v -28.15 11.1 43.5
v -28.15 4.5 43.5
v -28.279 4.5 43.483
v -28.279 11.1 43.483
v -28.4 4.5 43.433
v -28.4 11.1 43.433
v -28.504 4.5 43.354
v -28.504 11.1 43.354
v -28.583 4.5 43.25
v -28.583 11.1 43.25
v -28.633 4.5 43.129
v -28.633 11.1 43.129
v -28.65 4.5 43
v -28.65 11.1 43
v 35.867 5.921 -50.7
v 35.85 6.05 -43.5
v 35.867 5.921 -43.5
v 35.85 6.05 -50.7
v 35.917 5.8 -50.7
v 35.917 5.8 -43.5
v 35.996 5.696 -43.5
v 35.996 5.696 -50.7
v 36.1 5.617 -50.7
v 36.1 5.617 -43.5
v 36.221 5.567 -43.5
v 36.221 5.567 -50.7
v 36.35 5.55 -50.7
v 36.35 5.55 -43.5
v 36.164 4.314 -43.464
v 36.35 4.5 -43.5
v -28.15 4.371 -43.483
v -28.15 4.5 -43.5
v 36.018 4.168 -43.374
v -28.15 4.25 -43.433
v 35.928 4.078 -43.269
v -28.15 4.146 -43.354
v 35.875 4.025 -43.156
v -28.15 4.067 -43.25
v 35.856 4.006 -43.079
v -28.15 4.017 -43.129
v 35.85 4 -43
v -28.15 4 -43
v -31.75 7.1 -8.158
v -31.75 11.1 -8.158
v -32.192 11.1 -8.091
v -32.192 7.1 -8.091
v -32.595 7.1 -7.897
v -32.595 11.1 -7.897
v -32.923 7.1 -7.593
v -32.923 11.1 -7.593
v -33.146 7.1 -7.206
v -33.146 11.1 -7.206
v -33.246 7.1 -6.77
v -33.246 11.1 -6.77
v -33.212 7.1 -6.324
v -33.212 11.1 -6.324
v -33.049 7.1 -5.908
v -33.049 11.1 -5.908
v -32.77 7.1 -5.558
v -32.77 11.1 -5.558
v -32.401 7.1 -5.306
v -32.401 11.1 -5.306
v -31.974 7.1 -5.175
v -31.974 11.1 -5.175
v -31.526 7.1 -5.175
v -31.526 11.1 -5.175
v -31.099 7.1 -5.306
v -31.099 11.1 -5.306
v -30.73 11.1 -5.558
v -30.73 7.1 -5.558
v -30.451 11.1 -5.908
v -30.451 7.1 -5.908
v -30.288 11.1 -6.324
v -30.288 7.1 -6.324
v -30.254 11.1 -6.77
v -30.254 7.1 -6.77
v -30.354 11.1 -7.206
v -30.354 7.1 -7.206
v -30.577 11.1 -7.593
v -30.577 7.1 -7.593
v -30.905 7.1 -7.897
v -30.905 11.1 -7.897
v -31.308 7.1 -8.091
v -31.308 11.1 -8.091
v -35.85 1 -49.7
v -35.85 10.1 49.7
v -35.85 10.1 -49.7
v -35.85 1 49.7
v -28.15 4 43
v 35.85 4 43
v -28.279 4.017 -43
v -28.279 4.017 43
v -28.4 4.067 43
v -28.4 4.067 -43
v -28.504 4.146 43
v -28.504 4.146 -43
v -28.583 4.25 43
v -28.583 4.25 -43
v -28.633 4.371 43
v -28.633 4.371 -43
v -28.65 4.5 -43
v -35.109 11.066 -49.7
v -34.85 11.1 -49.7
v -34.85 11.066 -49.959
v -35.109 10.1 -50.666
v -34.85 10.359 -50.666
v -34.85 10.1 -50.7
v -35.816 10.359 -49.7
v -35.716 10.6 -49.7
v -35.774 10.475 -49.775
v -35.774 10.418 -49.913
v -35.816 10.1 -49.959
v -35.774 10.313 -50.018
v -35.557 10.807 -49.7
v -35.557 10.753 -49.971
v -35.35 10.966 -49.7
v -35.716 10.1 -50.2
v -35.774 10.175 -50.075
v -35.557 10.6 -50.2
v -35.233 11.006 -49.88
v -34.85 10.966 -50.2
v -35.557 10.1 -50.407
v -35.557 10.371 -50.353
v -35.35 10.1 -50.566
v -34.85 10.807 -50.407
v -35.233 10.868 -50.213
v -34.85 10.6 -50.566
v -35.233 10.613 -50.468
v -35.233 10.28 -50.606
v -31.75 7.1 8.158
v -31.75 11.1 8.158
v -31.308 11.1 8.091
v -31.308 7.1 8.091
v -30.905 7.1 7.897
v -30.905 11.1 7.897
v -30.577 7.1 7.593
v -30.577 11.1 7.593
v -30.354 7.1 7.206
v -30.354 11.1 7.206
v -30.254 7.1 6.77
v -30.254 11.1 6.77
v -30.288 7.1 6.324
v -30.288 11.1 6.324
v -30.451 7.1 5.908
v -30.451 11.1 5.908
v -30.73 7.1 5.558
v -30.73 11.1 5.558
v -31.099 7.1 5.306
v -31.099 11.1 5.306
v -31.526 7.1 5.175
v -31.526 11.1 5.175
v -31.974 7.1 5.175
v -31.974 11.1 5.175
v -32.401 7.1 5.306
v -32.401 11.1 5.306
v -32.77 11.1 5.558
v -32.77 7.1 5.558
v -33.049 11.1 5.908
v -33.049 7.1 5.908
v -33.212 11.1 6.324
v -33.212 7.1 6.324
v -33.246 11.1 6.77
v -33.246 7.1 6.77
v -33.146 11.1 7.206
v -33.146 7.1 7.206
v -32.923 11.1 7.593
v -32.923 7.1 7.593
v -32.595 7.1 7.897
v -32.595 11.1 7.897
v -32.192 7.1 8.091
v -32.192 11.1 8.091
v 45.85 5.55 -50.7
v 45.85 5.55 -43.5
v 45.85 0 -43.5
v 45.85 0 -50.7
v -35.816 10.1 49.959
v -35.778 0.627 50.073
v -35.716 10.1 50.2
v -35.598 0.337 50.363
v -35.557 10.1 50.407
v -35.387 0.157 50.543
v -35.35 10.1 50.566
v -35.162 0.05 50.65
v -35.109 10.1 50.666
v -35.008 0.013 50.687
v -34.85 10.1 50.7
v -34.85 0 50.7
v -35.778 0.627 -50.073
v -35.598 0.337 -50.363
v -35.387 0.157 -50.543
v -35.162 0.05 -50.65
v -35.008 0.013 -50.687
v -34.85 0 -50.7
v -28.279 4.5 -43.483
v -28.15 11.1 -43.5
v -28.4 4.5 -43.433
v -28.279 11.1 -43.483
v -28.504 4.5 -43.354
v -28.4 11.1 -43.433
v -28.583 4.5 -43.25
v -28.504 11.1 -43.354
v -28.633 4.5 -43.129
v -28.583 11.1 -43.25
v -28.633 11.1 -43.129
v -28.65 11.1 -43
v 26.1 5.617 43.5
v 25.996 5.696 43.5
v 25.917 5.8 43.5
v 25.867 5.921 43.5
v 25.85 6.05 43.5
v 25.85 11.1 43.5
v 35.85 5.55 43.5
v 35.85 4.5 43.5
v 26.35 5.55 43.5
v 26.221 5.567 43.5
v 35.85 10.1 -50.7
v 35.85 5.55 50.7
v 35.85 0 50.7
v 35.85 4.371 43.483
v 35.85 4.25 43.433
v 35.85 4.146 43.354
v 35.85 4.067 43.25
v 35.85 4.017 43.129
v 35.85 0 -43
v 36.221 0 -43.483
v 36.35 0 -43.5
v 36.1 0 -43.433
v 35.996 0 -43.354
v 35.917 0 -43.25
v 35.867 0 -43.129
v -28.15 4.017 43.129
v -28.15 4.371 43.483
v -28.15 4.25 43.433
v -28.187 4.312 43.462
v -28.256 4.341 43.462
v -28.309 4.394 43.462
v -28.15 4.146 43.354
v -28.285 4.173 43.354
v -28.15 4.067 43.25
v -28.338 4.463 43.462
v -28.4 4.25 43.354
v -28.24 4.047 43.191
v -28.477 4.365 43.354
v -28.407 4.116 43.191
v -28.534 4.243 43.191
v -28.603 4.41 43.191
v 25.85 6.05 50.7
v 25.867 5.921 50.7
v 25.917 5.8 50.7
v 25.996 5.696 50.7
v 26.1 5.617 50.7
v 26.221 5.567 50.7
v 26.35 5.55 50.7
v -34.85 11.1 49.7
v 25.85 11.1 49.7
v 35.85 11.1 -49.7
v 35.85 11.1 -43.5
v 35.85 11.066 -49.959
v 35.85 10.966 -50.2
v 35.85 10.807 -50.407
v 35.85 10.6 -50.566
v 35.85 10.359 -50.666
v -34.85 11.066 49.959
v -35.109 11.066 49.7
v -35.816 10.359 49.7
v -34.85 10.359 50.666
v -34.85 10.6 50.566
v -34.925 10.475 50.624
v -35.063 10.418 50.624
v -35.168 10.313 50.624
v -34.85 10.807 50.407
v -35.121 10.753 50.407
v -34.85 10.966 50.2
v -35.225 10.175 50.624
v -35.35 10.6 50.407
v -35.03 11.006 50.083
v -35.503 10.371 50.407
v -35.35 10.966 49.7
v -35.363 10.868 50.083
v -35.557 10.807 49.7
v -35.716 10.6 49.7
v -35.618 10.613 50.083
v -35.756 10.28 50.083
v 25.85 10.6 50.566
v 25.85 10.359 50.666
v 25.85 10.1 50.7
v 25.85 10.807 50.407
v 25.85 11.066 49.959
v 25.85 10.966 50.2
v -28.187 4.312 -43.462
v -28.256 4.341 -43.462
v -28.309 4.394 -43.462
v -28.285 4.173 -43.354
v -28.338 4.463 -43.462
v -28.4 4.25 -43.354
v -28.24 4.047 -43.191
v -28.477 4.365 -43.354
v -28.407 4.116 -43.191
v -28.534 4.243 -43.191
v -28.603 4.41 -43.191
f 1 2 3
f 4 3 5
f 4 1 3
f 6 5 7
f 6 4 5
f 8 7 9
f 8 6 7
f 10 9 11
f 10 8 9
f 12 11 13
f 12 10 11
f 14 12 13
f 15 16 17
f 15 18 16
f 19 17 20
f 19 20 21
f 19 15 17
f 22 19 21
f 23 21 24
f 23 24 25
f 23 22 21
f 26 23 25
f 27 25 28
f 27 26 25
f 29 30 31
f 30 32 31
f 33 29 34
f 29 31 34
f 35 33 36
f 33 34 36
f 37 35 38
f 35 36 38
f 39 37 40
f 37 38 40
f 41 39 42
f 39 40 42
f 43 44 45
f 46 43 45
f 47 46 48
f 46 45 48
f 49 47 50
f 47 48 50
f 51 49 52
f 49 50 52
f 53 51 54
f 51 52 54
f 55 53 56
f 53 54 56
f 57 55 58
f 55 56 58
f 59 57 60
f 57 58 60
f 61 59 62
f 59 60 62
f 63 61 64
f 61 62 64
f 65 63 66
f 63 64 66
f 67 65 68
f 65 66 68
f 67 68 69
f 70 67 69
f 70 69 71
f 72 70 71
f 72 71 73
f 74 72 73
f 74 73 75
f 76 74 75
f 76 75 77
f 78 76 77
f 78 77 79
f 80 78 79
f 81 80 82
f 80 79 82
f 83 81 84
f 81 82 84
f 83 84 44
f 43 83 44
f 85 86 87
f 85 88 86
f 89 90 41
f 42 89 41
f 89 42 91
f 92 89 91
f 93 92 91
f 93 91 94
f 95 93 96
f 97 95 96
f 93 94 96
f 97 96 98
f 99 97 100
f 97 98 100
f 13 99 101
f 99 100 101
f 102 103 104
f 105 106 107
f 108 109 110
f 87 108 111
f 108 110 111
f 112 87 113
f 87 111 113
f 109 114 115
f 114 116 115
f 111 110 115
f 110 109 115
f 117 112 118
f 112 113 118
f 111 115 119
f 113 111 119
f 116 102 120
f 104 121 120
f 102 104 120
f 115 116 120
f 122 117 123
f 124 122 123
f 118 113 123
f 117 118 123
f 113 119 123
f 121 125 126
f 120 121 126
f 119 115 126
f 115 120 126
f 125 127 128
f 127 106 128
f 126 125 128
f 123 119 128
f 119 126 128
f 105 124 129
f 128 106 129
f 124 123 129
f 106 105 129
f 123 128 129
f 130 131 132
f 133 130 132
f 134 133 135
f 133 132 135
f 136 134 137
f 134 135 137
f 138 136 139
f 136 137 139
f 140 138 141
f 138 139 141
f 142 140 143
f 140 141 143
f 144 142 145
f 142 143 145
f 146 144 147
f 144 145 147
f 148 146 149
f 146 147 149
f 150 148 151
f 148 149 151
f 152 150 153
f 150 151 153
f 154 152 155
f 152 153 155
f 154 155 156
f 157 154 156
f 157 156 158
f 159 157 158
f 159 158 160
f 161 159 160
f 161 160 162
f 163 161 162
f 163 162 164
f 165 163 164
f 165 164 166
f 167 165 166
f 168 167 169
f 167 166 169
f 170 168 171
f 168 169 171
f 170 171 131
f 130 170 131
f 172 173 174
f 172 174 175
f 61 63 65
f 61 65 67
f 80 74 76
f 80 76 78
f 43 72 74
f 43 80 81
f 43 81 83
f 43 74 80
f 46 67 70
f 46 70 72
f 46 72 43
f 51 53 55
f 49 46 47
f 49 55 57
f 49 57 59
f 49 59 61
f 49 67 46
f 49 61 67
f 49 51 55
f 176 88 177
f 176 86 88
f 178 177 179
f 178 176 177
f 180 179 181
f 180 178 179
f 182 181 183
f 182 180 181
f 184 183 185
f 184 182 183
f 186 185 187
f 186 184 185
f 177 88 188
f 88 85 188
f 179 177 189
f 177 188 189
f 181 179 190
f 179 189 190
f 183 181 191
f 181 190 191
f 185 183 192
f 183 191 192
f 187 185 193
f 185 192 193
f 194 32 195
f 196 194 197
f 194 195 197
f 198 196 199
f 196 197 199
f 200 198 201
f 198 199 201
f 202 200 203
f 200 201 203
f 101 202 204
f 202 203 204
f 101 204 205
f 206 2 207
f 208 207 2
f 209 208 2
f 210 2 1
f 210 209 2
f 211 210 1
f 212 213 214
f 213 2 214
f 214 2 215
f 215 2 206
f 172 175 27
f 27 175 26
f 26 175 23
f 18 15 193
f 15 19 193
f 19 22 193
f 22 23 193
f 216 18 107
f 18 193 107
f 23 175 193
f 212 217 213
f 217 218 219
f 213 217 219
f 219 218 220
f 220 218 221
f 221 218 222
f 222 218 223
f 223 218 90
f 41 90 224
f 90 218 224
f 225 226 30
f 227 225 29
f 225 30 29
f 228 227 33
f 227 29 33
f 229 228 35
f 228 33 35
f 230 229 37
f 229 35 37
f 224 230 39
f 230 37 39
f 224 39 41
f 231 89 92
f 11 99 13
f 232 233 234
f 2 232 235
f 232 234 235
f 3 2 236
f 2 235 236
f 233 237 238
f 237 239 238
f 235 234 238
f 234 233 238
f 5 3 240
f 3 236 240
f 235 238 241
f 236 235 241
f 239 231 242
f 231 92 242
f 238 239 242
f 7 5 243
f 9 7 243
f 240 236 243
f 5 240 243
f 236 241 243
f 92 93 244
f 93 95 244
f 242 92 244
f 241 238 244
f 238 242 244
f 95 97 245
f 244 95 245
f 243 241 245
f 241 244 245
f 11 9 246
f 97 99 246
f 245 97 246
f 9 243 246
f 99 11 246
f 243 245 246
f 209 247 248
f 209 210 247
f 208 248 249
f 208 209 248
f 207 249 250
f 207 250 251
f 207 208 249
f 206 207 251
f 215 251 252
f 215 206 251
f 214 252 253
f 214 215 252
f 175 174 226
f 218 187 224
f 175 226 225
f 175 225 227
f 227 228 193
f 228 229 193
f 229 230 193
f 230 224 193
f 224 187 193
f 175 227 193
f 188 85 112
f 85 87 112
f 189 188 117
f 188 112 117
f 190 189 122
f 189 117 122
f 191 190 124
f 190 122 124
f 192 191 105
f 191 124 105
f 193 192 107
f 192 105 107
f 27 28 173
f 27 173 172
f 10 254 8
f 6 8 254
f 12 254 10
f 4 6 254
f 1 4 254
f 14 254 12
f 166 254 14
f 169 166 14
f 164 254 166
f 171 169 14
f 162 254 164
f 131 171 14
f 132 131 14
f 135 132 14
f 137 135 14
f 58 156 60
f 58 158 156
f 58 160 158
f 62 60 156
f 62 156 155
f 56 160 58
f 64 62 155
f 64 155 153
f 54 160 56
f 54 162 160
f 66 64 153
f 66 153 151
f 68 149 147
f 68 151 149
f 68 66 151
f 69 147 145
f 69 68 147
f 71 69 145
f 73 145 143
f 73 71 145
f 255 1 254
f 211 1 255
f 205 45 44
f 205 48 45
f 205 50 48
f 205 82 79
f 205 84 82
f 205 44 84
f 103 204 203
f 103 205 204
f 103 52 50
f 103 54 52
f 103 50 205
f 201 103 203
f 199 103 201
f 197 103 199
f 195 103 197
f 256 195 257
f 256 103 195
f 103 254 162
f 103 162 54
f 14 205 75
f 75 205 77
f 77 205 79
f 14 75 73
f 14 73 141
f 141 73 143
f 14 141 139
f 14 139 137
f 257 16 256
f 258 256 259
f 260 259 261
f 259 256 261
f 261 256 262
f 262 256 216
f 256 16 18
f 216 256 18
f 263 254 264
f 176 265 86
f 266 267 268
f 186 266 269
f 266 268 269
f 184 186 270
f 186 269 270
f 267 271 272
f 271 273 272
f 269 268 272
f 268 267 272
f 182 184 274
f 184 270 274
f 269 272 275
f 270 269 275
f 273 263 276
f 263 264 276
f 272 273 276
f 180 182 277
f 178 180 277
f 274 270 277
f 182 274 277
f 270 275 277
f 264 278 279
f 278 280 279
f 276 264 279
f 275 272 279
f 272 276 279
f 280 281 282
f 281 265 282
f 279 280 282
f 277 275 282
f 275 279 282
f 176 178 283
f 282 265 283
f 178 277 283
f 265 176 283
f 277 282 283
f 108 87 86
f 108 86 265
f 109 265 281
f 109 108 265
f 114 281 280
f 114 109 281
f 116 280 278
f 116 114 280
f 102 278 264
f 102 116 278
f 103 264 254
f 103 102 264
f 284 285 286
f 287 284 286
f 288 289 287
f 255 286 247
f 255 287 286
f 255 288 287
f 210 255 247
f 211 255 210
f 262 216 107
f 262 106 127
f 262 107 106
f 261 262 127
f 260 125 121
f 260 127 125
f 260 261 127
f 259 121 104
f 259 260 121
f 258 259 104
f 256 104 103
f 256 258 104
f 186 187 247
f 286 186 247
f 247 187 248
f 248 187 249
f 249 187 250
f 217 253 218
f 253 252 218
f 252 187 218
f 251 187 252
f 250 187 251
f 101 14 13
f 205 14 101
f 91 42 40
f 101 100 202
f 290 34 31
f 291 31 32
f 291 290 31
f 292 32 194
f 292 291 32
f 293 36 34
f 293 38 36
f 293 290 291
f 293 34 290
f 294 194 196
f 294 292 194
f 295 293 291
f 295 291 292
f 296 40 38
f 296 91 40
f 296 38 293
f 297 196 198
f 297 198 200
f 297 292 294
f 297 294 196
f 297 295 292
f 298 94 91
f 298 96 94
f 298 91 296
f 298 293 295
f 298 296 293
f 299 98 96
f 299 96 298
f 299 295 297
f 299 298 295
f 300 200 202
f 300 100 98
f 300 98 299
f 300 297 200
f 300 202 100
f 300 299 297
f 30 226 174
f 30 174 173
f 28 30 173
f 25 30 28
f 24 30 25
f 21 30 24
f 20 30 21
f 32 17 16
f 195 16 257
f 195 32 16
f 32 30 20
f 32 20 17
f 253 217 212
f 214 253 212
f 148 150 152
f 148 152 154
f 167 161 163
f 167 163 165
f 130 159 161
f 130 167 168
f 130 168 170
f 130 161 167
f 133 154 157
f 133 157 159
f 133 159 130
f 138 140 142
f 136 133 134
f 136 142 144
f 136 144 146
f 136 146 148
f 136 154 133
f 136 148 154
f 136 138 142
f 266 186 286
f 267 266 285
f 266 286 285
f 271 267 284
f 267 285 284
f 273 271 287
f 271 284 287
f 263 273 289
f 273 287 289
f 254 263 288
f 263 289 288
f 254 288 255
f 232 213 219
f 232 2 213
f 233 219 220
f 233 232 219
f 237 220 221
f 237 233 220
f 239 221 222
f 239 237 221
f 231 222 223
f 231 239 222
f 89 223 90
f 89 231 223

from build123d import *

# Parameters (mm, degrees)
SKETCH1_W           = 71.7
SKETCH1_H           = 101.4
BOSS_EXTRUDE1_DEPTH = 11.1
SKETCH5_W           = 87
SKETCH5_H           = 14.461590439
CUT_EXTRUDE1_DEPTH  = 64.5
FILLET2_R           = 1
SKETCH7_R           = 1.5
CUT_EXTRUDE3_DEPTH  = 4
SKETCH10_W          = 8.724930765
SKETCH10_H          = 5.55
CUT_EXTRUDE5_DEPTH  = 10
SKETCH11_W          = 7.2
SKETCH11_H          = 5.55
BOSS_EXTRUDE2_DEPTH = 10
FILLET3_R           = 0.5


with BuildPart() as part:
    # Sketch1 → Boss-Extrude1 (new body)
    with BuildSketch(Plane(origin=(0, 0, 0), x_dir=(1, 0, 0), z_dir=(0, 1, 0))):
        Rectangle(SKETCH1_W, SKETCH1_H)
    extrude(amount=BOSS_EXTRUDE1_DEPTH)

    # Sketch5 → Cut-Extrude1 (cut)
    with BuildSketch(Plane(origin=(35.85, 0, 0), x_dir=(0, 0, -1), z_dir=(1, 0, 0))):
        with Locations((0, 11.23079522)):
            Rectangle(SKETCH5_W, SKETCH5_H)
    extrude(amount=-CUT_EXTRUDE1_DEPTH, mode=Mode.SUBTRACT)

    # Fillet2
    fillet2_edges = [part.edges().sort_by_distance(p)[0] for p in [
        (0, 11.1, -50.7),
        (-35.85, 11.1, 0),
        (-35.85, 0, 0),
        (0, 11.1, 50.7),
        (-35.85, 5.55, -50.7),
        (-35.85, 5.55, 50.7),
    ]]
    fillet(fillet2_edges, radius=FILLET2_R)

    # Sketch7 → Cut-Extrude3 (cut)
    with BuildSketch(Plane(origin=(0, 11.1, 0), x_dir=(1, 0, 0), z_dir=(0, 1, 0))):
        with Locations(Location((-31.75, -6.65790951, 0), (0, 0, 270))):
            Circle(SKETCH7_R)
        with Locations(Location((-31.75, 6.65790951, 0), (0, 0, 90))):
            Circle(SKETCH7_R)
    extrude(amount=-CUT_EXTRUDE3_DEPTH, mode=Mode.SUBTRACT)

    # Sketch10 → Cut-Extrude5 (cut)
    with BuildSketch(Plane(origin=(35.85, 0, 0), x_dir=(0, 0, -1), z_dir=(1, 0, 0))):
        with Locations((-47.862465383, 8.325)):
            Rectangle(SKETCH10_W, SKETCH10_H)
    extrude(amount=-CUT_EXTRUDE5_DEPTH, mode=Mode.SUBTRACT)

    # Sketch11 → Boss-Extrude2 (add)
    with BuildSketch(Plane(origin=(35.85, 0, 0), x_dir=(0, 0, -1), z_dir=(1, 0, 0))):
        with Locations((47.1, 2.775)):
            Rectangle(SKETCH11_W, SKETCH11_H)
    extrude(amount=BOSS_EXTRUDE2_DEPTH)

    # Fillet3
    fillet3_edges = [part.edges().sort_by_distance(p)[0] for p in [
        (-28.65, 4, 0),
        (3.6, 4, -43.5),
        (3.6, 4, 43.5),
        (-28.65, 7.55, -43.5),
        (-28.65, 7.55, 43.5),
        (25.85, 5.55, 47.1),
        (35.85, 5.55, -47.1),
        (35.85, 2, -43.5),
    ]]
    fillet(fillet3_edges, radius=FILLET3_R)


solid = part.part
